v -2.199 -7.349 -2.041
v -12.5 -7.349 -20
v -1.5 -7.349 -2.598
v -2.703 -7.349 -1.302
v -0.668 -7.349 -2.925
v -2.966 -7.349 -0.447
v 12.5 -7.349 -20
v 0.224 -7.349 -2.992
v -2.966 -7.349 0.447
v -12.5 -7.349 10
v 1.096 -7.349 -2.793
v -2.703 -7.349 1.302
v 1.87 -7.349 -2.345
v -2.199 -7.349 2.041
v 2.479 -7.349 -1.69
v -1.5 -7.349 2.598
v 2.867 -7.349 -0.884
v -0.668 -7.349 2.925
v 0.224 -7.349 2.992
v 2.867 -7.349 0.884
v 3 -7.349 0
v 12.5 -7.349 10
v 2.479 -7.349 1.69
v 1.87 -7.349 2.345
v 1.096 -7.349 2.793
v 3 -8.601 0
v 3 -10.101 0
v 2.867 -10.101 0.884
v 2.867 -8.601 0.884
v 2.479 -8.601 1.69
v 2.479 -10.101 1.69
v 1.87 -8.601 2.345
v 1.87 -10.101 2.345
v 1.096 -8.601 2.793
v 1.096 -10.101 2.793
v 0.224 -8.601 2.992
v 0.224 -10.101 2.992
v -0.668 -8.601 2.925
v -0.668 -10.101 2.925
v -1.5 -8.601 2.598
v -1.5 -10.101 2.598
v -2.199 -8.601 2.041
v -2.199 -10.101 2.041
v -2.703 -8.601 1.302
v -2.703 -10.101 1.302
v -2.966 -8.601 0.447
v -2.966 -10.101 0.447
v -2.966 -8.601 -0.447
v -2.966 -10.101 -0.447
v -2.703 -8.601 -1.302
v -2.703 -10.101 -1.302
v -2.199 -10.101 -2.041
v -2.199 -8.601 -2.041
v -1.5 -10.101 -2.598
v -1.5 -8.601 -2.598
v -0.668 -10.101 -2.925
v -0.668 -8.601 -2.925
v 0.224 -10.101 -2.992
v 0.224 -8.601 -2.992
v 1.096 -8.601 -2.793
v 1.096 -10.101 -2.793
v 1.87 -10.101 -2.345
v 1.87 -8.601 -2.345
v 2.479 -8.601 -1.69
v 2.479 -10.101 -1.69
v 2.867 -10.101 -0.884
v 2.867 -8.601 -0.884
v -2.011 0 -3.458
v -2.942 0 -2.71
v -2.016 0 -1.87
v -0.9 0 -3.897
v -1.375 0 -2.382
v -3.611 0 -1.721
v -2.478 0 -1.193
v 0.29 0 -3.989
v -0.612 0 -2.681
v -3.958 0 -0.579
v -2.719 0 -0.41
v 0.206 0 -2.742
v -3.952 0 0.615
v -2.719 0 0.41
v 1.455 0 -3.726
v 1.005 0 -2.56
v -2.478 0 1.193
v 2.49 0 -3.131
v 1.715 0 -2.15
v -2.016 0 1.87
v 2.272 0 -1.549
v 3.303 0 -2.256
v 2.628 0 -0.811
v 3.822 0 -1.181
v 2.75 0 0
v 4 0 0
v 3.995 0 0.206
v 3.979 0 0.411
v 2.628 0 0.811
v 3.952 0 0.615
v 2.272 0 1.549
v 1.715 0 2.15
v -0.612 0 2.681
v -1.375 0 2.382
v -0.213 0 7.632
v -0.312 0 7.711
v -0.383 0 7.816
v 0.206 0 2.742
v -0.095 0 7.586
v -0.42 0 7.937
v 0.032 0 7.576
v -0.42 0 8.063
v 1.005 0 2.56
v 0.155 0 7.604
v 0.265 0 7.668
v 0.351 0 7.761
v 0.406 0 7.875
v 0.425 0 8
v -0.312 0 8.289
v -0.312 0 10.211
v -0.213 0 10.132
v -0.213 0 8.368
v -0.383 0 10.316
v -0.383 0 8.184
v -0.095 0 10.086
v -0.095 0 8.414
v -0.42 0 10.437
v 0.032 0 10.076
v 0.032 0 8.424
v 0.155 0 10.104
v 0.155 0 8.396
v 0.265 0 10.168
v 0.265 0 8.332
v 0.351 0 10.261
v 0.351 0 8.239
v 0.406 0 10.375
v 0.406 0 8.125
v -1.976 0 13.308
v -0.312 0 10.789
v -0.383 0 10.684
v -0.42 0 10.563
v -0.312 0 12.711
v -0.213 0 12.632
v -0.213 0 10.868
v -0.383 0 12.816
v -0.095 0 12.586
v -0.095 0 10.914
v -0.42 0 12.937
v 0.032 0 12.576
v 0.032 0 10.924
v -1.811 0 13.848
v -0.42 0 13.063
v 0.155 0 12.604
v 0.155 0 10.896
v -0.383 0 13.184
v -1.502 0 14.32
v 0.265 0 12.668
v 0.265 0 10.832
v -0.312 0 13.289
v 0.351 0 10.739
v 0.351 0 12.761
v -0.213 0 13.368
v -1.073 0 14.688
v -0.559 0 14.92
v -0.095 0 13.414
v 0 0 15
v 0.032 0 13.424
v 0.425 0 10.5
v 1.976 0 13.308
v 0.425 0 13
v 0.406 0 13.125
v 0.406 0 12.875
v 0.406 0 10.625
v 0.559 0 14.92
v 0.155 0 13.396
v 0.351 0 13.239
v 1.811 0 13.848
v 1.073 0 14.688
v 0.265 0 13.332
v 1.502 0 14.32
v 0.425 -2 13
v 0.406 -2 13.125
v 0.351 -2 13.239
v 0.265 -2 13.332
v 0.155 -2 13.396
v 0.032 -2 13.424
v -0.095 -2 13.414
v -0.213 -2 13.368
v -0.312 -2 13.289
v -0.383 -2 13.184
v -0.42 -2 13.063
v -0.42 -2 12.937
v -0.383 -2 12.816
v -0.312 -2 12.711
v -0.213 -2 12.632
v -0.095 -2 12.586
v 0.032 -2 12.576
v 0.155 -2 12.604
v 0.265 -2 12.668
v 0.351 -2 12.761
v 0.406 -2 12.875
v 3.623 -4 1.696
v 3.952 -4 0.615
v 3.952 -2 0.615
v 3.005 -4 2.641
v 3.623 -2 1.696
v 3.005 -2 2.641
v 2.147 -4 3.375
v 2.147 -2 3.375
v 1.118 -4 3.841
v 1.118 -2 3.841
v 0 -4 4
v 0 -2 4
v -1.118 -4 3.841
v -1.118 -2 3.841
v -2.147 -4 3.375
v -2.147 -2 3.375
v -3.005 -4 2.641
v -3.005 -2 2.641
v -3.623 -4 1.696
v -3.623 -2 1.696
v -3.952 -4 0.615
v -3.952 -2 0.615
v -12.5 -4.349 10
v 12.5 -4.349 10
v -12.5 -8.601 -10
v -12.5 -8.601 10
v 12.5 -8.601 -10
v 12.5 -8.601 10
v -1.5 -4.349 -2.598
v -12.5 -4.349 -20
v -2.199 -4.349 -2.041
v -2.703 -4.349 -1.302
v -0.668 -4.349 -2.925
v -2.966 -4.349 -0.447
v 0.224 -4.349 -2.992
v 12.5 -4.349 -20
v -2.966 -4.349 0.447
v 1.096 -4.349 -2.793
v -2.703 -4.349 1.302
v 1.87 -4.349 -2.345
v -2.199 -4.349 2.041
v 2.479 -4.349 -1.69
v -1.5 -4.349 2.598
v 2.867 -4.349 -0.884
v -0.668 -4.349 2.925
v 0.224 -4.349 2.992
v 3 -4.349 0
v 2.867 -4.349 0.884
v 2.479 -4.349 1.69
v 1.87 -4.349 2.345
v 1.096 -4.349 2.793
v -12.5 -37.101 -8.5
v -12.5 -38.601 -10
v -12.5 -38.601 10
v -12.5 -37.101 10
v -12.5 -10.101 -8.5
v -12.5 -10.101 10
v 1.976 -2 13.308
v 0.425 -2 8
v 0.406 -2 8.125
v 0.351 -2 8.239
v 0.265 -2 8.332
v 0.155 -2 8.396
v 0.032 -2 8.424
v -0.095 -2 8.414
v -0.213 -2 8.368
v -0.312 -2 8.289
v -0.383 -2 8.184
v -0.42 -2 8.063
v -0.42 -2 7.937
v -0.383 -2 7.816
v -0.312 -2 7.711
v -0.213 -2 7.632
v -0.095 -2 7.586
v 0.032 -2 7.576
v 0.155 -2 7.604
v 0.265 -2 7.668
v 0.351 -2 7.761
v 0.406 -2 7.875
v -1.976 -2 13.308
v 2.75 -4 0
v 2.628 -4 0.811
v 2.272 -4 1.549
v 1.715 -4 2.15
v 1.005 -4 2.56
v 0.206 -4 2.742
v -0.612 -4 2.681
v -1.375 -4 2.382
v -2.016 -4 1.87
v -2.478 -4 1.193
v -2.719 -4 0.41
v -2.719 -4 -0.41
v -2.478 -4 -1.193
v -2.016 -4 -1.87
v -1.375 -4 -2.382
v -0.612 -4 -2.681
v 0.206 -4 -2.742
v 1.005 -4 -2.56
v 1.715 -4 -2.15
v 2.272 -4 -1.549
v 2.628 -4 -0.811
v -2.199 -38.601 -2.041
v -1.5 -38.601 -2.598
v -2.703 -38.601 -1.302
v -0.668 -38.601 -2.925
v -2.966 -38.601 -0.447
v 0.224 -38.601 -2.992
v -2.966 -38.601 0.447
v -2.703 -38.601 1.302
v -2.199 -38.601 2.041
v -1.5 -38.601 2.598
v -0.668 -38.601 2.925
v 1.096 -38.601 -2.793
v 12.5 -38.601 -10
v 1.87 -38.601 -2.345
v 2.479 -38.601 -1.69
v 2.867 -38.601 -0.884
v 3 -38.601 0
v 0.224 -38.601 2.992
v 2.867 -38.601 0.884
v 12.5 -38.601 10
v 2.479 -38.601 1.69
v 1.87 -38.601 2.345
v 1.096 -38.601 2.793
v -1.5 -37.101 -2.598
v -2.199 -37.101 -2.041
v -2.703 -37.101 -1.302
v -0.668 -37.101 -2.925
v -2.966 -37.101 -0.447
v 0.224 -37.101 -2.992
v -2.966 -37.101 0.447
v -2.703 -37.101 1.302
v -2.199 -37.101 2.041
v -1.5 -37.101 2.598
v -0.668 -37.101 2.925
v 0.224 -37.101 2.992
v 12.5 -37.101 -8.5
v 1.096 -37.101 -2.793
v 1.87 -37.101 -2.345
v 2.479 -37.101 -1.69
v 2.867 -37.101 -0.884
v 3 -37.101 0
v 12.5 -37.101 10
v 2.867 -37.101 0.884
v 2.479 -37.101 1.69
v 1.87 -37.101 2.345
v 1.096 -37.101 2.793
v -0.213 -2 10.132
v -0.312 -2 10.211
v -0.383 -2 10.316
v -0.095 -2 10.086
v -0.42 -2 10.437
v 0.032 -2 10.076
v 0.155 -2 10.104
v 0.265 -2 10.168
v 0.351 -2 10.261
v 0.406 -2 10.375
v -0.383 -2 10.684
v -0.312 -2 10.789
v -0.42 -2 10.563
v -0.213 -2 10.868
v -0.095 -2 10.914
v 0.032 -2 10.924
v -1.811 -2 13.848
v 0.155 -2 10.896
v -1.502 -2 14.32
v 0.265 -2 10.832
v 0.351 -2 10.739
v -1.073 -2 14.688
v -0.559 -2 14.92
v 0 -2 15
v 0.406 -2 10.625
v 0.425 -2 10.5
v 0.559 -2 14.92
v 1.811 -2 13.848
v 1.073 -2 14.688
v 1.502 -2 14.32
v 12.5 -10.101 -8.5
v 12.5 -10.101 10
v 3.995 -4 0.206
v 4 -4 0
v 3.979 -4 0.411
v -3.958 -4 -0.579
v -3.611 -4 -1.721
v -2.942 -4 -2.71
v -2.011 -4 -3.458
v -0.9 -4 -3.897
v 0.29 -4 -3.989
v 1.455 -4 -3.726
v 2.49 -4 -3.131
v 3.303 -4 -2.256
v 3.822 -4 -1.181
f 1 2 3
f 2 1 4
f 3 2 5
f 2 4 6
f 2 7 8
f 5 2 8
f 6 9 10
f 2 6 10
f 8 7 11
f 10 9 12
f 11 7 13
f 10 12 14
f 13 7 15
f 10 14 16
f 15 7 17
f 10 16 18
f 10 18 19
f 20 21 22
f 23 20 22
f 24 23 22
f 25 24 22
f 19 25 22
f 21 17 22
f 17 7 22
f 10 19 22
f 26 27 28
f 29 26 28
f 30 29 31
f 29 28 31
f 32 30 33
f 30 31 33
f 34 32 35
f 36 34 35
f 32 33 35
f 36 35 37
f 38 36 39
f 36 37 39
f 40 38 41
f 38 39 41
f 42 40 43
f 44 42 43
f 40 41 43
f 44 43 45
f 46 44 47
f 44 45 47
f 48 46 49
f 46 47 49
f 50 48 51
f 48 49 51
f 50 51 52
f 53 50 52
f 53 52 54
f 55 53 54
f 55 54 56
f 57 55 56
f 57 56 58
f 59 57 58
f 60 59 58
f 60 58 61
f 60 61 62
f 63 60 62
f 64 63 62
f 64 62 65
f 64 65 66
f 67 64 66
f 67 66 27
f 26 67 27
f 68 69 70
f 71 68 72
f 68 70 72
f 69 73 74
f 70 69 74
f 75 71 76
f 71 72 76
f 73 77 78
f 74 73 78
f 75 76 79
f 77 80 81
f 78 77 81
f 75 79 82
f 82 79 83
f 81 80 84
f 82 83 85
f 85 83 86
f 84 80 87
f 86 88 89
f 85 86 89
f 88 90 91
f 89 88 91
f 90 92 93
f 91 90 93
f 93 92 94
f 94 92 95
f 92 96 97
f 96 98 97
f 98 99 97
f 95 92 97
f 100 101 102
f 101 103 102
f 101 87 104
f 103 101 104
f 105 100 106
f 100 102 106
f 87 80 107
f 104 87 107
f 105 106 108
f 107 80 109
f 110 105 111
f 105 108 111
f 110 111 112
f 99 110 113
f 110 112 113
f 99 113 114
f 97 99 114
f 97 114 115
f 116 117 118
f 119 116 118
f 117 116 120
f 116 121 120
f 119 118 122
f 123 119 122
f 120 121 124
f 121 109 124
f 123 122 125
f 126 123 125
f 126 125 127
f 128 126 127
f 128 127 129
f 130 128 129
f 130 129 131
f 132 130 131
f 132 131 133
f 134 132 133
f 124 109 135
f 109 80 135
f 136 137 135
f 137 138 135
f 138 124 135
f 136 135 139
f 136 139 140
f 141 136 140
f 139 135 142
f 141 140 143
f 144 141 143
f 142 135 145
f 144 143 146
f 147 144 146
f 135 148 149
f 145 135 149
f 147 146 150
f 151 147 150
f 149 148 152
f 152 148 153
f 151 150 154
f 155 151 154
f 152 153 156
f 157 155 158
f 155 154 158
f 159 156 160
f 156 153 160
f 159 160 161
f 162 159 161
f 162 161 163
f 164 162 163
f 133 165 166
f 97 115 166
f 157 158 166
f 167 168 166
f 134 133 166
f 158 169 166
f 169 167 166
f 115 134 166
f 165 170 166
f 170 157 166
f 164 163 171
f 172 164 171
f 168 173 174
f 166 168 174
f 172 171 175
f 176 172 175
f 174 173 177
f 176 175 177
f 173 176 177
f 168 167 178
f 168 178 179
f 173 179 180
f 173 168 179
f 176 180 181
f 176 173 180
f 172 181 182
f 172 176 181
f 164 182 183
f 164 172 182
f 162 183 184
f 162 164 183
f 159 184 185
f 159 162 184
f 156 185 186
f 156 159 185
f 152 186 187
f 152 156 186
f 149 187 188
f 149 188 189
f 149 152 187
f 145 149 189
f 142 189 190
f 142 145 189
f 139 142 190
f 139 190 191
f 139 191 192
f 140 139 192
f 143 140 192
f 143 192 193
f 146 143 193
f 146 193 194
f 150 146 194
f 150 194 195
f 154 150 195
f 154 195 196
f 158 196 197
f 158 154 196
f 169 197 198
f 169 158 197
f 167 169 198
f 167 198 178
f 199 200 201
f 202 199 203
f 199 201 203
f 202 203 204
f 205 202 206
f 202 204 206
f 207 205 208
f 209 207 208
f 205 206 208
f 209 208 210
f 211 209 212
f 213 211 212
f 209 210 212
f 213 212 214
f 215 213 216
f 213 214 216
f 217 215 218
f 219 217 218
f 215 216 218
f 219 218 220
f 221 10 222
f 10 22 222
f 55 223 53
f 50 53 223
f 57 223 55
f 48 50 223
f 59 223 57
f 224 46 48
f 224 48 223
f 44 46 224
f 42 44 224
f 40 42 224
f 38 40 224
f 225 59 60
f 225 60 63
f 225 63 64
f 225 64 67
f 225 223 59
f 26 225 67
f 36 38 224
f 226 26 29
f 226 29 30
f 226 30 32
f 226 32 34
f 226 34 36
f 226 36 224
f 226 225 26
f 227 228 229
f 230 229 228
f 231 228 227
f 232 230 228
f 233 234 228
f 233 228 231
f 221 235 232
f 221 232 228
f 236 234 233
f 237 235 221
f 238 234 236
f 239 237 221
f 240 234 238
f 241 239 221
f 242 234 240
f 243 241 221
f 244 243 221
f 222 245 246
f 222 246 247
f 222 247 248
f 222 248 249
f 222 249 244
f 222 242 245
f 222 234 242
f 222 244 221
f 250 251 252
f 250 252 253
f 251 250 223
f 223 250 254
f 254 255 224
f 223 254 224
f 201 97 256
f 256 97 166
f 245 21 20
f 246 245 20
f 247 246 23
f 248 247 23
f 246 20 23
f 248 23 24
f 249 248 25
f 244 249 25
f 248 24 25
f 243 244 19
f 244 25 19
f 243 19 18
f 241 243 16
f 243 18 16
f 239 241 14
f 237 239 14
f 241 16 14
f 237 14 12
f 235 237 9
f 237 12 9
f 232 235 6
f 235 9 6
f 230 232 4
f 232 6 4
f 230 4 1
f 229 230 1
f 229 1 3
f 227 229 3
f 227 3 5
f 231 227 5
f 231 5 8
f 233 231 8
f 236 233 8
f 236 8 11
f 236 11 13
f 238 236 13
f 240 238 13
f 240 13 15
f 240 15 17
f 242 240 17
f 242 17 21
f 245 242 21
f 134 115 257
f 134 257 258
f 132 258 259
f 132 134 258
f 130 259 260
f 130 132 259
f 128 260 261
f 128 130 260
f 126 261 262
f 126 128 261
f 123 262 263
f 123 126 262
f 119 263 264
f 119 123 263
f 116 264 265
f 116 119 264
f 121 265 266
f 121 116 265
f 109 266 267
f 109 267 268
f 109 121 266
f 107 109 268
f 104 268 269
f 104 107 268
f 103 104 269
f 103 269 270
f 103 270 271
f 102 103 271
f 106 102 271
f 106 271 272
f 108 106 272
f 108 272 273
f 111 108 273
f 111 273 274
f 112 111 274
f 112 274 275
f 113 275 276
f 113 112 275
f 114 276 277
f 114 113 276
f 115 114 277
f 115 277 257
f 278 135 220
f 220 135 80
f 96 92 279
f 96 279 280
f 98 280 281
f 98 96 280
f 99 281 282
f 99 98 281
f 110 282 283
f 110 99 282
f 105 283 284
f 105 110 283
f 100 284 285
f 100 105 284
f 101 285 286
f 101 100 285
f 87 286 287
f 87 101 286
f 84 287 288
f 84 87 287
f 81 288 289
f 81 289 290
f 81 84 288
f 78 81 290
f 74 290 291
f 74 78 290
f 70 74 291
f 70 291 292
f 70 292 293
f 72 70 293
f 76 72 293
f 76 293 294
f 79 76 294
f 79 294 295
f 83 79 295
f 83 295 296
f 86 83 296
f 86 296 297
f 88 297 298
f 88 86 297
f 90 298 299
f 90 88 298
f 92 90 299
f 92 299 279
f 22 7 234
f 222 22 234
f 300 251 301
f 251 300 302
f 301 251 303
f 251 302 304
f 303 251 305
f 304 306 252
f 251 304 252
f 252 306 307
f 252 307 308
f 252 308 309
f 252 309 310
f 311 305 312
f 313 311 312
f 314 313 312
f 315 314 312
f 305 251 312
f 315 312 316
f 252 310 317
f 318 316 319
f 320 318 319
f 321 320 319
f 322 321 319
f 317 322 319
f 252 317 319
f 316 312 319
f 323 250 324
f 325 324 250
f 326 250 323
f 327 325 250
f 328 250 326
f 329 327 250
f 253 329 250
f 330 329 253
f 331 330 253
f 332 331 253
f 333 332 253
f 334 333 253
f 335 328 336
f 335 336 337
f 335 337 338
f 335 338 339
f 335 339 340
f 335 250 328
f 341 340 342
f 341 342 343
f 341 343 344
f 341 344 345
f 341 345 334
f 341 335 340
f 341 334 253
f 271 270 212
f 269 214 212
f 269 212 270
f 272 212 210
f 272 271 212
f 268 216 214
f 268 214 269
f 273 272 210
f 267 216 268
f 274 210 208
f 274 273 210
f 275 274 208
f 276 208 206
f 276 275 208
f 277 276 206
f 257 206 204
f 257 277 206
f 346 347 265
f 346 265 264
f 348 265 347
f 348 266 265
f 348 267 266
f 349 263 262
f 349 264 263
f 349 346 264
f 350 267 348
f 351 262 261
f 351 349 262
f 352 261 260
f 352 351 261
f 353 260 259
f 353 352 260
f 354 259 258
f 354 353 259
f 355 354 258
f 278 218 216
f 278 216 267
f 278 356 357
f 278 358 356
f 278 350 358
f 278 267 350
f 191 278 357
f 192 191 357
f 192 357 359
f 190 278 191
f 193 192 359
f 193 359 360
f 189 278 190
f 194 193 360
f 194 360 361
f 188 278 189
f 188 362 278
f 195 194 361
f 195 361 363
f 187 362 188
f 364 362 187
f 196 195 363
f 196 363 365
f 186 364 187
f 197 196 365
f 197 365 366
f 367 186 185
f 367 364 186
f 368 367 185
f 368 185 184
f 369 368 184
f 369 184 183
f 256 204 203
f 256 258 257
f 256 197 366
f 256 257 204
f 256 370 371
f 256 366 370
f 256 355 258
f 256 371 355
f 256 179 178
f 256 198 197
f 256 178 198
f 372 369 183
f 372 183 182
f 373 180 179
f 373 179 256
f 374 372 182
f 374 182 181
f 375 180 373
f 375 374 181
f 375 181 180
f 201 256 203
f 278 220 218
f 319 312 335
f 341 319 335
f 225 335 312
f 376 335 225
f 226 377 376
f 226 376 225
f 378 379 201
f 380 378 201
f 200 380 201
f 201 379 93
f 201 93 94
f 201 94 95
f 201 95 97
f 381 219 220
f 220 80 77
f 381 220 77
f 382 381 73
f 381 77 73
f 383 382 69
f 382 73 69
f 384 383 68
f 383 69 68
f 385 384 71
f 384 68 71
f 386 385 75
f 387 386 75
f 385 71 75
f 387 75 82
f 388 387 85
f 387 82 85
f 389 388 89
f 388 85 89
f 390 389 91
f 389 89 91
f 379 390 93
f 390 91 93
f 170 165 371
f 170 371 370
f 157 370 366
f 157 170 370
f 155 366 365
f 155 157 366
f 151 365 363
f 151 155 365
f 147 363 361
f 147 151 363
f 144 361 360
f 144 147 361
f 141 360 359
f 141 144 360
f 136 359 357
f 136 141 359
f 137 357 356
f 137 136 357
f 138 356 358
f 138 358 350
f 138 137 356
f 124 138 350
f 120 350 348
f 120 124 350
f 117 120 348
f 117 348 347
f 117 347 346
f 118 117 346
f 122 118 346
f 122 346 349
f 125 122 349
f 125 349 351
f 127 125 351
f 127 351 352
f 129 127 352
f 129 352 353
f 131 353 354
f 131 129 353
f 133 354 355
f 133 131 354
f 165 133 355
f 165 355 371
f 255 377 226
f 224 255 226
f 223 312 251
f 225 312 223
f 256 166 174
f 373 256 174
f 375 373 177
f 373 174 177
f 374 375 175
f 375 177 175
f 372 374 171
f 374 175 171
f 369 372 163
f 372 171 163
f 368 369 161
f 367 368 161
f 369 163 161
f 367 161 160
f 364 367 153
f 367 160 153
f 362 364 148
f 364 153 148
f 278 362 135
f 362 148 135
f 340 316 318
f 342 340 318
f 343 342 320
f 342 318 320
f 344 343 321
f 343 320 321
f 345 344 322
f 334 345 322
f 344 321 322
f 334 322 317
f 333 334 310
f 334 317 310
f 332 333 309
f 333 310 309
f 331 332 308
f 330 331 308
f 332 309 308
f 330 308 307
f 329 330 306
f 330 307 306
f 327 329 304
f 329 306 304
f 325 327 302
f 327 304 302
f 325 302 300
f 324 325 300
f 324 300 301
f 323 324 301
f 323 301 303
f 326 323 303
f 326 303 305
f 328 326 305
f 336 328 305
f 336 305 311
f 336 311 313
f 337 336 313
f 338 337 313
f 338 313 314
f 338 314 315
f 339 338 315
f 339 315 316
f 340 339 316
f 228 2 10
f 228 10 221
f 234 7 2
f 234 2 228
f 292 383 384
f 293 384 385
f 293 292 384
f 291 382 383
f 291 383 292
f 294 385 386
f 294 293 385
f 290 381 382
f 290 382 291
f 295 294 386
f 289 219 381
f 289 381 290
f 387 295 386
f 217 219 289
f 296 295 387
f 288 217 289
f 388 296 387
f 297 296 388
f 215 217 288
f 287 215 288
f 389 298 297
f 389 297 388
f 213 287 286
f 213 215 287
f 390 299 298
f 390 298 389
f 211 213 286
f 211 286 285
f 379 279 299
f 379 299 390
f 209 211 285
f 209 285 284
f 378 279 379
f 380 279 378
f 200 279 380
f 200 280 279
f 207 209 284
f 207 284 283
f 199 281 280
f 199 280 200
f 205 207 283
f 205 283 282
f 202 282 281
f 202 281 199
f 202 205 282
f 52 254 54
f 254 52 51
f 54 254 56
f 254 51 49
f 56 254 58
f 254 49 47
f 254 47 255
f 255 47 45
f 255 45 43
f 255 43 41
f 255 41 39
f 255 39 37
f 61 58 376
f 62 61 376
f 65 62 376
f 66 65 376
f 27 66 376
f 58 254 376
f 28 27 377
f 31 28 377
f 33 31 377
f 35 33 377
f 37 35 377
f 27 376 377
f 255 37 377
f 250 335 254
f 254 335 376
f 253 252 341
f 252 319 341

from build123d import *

# Parameters (mm, degrees)
F0_R     = 0.425
F1_DEPTH = 2
F0_R_2   = 2.75
F2_DEPTH = 4
F3_W     = 30
F3_H     = 20
F4_DEPTH = 12.5
F5_T     = -1.5
F3_W_2   = 3
F3_H_2   = 30
F6_DEPTH = 12.5
F7_R     = 3
F8_DEPTH = 38.6021898518


with BuildPart() as f1:
    # F0 (on Front) → F1 (new body)
    with BuildSketch(Plane.XZ):
        with BuildLine():
            ThreePointArc((-3.952379255, 0.6153846154), (0, 4), (3.952379255, 0.6153846154))
            Line((3.952379255, 0.6153846154), (1.9761896275, 13.3076923077))
            ThreePointArc((1.9761896275, 13.3076923077), (1.9940385221, 13.1543061001), (2, 13))
            ThreePointArc((2, 13), (-0.1543061001, 11.0059614779), (-1.9761896275, 13.3076923077))
            Line((-1.9761896275, 13.3076923077), (-3.952379255, 0.6153846154))
        make_face()
        with Locations((0, 8)):
            Circle(F0_R, mode=Mode.SUBTRACT)
        with Locations((0, 10.5)):
            Circle(F0_R, mode=Mode.SUBTRACT)
        with BuildLine():
            ThreePointArc((2, 13), (1.9940385221, 13.1543061001), (1.9761896275, 13.3076923077))
            ThreePointArc((1.9761896275, 13.3076923077), (0, 15), (-1.9761896275, 13.3076923077))
            ThreePointArc((-1.9761896275, 13.3076923077), (-0.1543061001, 11.0059614779), (2, 13))
        make_face()
        with Locations((0, 13)):
            Circle(F0_R, mode=Mode.SUBTRACT)
    extrude(amount=F1_DEPTH)

    # F0 (on Front) → F2 (join)
    with BuildSketch(Plane.XZ):
        with BuildLine():
            ThreePointArc((-3.952379255, 0.6153846154), (-0.3086122001, -3.9880770441), (4, 0))
            ThreePointArc((4, 0), (3.9880770441, 0.3086122001), (3.952379255, 0.6153846154))
            ThreePointArc((3.952379255, 0.6153846154), (0, 4), (-3.952379255, 0.6153846154))
        make_face()
        Circle(F0_R_2, mode=Mode.SUBTRACT)
    extrude(amount=F2_DEPTH)


with BuildPart() as f4:
    # F3 (on Right) → F4 (new body, symmetric)
    with BuildSketch(Plane.YZ):
        with Locations((-23.6011898518, 0)):
            Rectangle(F3_W, F3_H)
    extrude(amount=F4_DEPTH, both=True)

    # F5
    f5_openings = [f4.faces().sort_by_distance(p)[0] for p in [
        (12.5, -23.60119, 0),
        (0, -23.60119, 10),
        (-12.5, -23.60119, 0),
    ]]
    offset(amount=F5_T, openings=f5_openings)


with BuildPart() as f6:
    # F3 (on Right) → F6 (new body, symmetric)
    with BuildSketch(Plane.YZ):
        with Locations((-5.8492033407, -5)):
            Rectangle(F3_W_2, F3_H_2)
    extrude(amount=F6_DEPTH, both=True)


with BuildPart() as f8:
    # F7 (on face) → F8 (new body, through all)
    with BuildSketch(Plane.XZ.offset(38.6011898518)):
        Circle(F7_R)
    extrude(amount=-F8_DEPTH)


with BuildPart() as f4_1:
    add(f4.part)

    # F9: cut F8
    add(f8.part, mode=Mode.SUBTRACT)


with BuildPart() as f6_1:
    add(f6.part)

    # F9: cut F8
    add(f8.part, mode=Mode.SUBTRACT)


solid = Compound([f1.part, f4_1.part, f6_1.part])
